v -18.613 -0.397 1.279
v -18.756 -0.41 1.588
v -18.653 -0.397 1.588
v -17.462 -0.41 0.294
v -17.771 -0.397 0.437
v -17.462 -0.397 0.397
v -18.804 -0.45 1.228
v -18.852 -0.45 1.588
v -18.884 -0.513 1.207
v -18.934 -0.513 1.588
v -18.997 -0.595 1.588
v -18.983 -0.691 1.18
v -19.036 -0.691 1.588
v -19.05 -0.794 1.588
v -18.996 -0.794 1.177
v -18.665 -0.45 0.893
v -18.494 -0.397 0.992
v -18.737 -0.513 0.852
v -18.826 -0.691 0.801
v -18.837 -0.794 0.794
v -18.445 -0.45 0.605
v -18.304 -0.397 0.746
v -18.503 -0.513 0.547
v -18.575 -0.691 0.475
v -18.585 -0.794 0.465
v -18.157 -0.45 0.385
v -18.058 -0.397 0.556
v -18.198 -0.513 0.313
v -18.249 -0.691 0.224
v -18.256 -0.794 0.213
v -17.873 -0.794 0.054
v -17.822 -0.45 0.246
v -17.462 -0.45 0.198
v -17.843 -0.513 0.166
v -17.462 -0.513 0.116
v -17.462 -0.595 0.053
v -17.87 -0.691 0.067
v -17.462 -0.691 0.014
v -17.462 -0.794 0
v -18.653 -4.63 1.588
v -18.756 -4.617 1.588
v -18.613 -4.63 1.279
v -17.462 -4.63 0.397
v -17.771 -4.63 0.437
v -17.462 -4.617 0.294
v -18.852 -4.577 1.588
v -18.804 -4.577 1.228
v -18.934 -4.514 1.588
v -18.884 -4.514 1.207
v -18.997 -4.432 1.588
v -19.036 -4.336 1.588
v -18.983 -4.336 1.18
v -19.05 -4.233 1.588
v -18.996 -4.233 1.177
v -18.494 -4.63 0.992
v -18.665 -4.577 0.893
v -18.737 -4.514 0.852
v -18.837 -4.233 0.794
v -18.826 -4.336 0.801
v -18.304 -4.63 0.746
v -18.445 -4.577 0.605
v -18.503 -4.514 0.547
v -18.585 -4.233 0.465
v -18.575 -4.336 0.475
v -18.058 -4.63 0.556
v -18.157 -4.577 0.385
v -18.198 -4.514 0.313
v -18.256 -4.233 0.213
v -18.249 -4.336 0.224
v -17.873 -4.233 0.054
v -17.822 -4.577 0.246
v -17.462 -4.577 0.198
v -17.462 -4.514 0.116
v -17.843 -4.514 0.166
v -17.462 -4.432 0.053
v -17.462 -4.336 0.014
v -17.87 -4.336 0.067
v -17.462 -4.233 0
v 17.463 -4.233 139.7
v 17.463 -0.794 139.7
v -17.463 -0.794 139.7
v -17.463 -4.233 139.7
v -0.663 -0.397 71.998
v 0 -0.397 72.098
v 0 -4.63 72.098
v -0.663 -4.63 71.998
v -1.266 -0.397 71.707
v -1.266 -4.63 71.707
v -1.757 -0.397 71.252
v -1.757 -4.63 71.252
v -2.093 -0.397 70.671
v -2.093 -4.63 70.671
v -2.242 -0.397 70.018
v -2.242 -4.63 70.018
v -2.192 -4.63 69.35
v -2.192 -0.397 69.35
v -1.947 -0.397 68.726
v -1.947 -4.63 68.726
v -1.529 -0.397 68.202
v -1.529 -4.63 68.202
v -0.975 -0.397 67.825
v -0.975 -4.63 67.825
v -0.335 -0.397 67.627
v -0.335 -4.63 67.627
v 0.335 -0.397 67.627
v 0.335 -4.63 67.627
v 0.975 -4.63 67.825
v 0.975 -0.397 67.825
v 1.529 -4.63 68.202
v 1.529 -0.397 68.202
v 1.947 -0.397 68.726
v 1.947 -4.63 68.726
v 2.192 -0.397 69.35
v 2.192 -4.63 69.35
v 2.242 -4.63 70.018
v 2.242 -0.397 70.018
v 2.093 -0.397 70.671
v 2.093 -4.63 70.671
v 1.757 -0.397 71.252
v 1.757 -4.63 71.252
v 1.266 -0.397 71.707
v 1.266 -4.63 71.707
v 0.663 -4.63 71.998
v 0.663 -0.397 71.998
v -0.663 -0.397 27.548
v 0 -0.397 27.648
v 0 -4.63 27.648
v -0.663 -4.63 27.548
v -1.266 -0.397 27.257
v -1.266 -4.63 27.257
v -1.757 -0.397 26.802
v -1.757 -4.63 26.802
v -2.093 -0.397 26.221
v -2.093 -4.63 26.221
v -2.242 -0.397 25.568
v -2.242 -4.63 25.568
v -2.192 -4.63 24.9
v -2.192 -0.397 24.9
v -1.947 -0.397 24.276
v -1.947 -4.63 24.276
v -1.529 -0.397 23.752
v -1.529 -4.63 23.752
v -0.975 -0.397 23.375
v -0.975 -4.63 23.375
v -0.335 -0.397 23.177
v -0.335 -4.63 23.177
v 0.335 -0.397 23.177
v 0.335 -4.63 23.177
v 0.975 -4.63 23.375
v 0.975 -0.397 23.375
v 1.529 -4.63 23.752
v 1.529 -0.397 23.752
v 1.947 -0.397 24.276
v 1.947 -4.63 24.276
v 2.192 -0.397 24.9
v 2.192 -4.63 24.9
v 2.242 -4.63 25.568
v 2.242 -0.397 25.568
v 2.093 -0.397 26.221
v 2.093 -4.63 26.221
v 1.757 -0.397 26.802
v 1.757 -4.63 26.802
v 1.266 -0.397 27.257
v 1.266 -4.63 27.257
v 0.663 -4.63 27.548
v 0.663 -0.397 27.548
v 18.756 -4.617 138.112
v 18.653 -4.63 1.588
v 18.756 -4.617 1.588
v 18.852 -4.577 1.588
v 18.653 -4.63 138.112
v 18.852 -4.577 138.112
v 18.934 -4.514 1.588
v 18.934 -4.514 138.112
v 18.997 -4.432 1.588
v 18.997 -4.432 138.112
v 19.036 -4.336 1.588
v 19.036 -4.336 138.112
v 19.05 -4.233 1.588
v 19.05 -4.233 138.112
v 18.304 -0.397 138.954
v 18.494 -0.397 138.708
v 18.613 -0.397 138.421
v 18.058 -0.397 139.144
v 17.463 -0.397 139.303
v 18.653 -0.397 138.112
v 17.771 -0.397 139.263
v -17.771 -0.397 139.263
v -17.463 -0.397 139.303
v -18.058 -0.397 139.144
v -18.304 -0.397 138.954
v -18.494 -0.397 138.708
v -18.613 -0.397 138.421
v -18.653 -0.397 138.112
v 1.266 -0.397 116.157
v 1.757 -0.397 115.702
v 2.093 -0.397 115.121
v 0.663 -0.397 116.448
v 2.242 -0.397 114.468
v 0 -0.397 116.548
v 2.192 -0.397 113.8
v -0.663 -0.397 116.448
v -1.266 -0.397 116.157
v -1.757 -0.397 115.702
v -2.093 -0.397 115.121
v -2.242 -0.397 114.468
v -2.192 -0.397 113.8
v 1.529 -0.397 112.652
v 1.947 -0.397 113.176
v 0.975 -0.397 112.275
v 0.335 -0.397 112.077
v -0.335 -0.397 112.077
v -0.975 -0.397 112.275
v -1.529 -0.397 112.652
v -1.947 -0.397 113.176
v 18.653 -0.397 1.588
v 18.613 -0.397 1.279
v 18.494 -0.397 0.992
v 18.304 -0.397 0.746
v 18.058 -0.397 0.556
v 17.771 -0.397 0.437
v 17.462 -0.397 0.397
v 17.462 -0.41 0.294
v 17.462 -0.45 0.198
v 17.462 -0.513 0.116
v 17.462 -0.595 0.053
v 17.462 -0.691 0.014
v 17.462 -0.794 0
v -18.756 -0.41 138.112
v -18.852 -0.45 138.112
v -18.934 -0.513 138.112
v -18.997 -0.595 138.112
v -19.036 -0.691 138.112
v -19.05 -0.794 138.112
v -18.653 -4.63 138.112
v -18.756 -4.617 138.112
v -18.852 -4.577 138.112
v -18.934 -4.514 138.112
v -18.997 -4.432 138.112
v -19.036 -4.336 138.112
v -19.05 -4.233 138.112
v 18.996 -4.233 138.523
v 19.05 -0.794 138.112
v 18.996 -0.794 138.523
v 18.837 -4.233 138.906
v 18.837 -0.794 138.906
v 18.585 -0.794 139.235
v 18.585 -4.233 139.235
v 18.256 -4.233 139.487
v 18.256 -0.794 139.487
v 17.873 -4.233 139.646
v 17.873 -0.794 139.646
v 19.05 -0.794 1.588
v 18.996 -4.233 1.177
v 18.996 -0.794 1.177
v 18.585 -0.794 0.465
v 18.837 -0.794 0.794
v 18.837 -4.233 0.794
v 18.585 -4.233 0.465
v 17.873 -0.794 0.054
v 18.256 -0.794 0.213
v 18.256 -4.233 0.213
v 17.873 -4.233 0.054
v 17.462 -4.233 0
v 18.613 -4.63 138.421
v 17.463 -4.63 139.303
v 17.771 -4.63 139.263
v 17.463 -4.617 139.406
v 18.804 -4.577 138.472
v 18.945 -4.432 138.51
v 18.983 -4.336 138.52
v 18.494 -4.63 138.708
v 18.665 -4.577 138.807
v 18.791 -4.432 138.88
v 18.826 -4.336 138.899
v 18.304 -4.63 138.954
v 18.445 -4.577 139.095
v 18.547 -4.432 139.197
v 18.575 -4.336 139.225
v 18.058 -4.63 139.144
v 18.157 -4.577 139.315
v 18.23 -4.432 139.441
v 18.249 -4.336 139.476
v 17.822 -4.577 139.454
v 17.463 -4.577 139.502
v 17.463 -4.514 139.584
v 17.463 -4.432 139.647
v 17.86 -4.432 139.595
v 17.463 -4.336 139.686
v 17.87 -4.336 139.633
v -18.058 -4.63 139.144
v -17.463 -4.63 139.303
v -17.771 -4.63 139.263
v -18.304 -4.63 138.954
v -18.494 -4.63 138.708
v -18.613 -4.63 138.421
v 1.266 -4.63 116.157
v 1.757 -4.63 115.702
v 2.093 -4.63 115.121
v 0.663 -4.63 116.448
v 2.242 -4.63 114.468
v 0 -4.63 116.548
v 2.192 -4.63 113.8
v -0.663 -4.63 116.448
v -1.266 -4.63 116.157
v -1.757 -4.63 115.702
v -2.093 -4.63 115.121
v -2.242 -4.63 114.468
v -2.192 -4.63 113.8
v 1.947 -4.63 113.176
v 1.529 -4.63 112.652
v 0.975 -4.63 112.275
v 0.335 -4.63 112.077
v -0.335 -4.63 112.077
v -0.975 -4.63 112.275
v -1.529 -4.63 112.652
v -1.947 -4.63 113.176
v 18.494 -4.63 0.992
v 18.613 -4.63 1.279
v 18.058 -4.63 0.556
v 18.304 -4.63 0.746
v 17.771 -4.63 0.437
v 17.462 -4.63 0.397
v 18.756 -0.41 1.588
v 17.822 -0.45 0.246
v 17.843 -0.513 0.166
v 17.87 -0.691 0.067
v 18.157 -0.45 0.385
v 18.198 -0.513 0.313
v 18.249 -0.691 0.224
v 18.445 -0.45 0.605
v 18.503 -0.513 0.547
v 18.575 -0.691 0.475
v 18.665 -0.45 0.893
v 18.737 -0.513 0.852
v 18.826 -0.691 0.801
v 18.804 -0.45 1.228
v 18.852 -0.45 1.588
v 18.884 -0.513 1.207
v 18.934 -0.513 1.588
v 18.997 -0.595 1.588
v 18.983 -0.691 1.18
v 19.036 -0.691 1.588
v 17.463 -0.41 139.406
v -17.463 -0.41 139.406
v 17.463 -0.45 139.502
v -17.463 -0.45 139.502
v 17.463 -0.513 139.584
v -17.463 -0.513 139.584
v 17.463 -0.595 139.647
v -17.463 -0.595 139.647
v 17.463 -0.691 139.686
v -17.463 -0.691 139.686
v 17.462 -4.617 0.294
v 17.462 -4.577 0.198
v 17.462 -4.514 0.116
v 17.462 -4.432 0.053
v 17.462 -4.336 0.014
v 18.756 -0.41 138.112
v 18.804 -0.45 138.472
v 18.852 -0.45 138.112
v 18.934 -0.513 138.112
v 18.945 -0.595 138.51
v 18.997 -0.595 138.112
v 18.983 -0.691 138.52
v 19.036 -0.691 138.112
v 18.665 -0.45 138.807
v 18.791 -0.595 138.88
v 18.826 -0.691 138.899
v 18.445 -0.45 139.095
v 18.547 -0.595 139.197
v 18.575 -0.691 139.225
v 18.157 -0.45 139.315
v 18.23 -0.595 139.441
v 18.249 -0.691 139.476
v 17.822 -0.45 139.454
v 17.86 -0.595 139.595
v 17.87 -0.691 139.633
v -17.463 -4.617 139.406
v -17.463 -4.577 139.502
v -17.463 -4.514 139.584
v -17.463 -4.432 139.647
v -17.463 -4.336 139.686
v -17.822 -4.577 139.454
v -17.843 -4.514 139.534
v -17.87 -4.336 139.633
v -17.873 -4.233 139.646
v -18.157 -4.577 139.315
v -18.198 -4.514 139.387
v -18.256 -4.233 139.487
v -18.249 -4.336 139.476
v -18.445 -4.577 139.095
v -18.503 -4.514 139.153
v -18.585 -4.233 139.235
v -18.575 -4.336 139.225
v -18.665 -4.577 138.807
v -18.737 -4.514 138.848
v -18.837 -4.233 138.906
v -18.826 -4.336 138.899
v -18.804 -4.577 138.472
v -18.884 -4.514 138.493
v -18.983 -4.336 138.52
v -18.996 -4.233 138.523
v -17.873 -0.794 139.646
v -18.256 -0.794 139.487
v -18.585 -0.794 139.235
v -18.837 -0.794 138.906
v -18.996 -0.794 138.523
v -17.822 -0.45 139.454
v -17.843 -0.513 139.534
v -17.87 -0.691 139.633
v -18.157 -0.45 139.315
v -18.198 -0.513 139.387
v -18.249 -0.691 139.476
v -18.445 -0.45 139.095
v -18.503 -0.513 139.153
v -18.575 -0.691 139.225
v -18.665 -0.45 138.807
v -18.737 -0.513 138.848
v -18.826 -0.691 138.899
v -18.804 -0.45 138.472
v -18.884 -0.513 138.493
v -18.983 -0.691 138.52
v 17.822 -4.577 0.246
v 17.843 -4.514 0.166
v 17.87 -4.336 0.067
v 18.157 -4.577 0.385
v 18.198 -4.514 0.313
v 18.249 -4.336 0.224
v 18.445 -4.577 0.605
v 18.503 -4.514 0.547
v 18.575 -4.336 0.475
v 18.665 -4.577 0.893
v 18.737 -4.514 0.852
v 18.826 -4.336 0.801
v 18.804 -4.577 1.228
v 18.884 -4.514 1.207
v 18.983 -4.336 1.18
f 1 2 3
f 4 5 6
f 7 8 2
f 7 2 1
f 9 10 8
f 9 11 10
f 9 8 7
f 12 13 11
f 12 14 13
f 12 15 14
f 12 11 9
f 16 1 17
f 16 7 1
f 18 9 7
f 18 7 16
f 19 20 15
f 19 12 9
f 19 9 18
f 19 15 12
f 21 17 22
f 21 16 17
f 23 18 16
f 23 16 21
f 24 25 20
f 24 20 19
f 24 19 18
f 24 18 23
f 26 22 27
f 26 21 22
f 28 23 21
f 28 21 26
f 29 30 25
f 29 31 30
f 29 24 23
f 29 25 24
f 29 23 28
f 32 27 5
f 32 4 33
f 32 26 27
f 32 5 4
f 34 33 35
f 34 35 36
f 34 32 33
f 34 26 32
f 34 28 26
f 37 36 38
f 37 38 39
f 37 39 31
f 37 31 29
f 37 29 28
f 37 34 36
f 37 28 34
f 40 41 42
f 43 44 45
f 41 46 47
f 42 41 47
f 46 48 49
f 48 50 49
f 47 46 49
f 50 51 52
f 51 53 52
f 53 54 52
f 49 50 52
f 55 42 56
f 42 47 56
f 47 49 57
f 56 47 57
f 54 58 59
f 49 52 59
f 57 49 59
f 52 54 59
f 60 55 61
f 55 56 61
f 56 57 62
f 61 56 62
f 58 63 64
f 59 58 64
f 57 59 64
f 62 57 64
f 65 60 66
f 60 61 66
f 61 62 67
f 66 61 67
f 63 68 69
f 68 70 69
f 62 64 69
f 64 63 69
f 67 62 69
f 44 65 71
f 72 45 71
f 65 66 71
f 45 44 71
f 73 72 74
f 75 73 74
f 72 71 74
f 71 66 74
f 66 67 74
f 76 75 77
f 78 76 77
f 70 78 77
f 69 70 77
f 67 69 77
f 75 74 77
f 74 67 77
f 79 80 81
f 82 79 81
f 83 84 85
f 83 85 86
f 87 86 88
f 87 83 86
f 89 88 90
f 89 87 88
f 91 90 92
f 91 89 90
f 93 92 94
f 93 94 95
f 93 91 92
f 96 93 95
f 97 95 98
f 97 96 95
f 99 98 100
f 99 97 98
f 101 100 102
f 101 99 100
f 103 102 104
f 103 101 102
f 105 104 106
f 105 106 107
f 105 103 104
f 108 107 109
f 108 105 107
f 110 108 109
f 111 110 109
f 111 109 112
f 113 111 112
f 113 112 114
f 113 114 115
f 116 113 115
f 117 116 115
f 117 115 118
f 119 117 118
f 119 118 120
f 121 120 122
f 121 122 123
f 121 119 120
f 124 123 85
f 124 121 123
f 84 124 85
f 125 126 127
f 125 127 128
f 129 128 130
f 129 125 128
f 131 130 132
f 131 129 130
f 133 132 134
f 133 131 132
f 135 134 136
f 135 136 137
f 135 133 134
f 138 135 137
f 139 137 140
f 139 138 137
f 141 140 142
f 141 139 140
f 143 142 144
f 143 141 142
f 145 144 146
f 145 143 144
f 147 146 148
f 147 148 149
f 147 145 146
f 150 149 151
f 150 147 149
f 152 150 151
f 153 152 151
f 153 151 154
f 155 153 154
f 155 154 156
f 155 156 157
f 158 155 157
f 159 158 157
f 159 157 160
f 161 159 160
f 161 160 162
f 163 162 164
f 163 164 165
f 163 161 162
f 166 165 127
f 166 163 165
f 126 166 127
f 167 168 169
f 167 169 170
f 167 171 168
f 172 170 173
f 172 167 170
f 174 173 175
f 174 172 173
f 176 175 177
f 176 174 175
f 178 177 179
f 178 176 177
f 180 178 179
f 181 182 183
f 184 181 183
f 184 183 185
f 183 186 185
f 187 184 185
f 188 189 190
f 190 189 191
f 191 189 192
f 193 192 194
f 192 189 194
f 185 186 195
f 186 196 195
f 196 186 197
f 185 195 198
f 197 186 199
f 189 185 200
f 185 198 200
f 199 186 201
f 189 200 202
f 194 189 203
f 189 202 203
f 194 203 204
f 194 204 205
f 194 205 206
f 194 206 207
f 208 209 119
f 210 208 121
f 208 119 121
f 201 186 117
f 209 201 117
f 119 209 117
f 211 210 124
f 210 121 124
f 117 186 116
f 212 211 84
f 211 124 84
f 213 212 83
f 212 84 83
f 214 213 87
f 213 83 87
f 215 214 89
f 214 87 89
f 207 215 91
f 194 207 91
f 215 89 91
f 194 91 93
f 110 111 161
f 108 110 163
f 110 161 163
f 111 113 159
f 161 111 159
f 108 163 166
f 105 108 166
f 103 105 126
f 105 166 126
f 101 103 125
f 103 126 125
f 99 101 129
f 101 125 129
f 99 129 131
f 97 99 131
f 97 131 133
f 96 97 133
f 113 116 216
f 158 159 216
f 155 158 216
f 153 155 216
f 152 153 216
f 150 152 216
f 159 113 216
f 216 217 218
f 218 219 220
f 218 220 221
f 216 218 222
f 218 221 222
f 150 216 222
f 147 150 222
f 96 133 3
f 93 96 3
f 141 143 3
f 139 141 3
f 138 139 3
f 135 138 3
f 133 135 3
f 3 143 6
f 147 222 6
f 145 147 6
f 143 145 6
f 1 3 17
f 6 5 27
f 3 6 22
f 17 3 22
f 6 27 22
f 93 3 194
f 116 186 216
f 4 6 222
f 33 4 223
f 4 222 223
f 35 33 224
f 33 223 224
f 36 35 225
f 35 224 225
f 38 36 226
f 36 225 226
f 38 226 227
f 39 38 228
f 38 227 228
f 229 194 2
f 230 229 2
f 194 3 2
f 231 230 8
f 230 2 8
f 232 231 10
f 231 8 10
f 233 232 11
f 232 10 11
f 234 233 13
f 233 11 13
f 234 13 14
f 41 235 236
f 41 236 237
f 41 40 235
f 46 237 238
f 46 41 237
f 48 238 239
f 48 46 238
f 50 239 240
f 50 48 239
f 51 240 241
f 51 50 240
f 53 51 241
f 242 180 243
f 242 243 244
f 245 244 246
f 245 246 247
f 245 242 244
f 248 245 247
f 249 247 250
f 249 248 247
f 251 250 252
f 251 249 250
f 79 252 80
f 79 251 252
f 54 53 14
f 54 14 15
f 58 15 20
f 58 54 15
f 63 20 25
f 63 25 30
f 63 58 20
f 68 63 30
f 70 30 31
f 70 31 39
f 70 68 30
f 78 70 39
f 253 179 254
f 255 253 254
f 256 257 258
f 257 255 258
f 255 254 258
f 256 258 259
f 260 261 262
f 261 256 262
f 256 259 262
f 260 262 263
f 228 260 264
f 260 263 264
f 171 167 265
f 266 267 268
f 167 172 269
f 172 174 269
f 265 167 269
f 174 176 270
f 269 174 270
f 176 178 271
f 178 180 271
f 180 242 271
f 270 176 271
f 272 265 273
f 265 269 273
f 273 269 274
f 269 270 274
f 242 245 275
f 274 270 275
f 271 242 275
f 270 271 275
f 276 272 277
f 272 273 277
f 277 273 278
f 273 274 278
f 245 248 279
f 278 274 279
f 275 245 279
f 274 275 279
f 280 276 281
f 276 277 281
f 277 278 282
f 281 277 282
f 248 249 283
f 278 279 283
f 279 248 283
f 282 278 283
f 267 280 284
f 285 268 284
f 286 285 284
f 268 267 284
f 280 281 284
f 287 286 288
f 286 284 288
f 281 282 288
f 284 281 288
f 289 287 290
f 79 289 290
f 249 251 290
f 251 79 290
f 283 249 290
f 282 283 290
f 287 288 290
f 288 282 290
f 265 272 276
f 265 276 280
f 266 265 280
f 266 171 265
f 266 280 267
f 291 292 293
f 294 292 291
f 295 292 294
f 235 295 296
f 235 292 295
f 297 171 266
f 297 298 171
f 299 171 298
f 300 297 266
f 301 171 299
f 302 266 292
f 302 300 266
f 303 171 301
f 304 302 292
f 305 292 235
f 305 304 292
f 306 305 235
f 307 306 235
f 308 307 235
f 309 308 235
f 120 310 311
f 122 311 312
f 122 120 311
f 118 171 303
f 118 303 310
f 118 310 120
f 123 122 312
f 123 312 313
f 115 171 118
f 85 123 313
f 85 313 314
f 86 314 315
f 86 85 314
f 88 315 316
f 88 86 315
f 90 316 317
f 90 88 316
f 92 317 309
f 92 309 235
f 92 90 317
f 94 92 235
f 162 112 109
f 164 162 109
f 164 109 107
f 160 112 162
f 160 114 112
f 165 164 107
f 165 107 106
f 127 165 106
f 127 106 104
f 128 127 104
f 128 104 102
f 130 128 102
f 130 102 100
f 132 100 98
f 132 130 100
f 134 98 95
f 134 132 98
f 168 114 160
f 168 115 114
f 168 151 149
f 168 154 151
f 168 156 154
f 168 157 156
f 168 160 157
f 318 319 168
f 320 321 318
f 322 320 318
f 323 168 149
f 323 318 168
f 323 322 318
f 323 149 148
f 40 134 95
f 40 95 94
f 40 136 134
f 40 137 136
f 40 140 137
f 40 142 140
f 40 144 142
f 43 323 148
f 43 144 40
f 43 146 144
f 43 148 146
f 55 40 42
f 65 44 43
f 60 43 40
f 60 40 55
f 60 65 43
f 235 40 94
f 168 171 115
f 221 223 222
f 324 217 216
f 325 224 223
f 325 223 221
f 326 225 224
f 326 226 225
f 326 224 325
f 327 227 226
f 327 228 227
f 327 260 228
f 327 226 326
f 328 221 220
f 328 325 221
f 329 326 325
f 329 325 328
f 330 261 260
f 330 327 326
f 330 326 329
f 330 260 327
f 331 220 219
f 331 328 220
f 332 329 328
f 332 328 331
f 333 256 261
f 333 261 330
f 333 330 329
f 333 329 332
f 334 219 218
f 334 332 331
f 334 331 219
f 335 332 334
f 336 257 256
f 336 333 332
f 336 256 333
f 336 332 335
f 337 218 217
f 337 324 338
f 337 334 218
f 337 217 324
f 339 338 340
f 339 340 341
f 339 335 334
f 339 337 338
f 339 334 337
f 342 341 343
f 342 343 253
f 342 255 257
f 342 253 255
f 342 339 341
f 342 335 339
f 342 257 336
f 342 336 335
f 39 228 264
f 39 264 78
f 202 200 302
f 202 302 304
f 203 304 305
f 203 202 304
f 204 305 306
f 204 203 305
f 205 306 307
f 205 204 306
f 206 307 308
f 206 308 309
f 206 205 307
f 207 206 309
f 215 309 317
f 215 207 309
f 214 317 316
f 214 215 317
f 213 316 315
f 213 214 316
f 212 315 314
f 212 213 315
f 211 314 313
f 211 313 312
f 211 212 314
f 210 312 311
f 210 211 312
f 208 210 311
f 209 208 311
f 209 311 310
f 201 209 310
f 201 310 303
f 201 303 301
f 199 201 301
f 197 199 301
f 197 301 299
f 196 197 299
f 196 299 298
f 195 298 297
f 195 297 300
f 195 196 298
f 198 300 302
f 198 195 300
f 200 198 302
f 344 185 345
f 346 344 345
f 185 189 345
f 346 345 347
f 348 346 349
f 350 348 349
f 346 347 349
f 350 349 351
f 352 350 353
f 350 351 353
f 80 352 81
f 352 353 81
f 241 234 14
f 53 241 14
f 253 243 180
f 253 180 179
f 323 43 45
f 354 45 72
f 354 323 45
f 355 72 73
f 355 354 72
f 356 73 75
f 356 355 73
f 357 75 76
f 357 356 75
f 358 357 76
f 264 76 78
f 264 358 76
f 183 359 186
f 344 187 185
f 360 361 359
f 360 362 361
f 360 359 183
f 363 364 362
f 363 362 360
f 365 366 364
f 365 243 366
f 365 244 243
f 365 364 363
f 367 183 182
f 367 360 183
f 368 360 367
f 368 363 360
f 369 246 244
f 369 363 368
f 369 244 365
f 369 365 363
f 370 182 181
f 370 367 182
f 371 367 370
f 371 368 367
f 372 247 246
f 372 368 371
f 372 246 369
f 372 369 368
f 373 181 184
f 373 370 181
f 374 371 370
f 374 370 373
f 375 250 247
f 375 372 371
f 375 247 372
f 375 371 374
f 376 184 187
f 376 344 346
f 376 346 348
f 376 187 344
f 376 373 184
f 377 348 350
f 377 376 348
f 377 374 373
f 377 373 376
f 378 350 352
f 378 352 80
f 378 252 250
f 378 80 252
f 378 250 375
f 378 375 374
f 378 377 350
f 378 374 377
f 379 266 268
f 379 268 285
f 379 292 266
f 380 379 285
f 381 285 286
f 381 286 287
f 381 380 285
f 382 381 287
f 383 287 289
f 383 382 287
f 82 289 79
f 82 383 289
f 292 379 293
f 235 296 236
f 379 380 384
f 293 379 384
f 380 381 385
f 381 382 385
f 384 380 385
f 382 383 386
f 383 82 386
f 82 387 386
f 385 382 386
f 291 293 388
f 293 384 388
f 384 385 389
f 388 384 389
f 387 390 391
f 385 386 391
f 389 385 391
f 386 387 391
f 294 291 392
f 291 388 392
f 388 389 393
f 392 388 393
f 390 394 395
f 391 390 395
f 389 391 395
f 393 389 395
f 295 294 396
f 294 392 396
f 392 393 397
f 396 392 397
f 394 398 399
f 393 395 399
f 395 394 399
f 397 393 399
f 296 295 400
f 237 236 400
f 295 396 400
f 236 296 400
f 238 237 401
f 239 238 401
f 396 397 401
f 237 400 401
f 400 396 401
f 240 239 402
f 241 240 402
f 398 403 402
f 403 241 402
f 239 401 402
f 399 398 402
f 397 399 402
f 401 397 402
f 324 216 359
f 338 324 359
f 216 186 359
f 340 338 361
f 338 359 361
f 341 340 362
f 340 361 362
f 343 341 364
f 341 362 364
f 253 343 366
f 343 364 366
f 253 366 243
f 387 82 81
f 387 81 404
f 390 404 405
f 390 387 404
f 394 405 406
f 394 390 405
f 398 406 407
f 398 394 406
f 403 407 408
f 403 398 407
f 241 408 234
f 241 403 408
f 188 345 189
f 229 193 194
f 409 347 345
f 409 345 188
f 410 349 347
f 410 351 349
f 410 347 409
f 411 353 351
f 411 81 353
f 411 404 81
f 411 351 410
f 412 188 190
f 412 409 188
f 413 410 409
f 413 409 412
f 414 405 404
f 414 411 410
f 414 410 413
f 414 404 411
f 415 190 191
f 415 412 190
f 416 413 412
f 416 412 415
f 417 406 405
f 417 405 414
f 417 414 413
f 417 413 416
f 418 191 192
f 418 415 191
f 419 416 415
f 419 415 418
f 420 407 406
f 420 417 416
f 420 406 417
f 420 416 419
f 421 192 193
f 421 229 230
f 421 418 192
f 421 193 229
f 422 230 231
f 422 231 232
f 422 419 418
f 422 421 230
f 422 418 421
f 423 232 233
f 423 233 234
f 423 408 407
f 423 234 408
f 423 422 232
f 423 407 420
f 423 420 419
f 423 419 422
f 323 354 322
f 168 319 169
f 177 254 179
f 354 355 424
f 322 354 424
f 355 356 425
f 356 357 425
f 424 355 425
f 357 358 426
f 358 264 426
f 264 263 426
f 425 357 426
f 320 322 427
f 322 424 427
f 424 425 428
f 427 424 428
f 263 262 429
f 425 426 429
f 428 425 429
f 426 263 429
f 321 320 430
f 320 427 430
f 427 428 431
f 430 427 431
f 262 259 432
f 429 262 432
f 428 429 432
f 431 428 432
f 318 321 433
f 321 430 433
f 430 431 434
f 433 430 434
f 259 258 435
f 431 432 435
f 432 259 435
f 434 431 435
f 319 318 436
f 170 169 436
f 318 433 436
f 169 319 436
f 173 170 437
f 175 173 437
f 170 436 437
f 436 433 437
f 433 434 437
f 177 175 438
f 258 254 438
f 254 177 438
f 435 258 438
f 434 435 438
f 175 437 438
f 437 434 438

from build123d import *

# Parameters (mm, degrees)
BOSS_EXTRUDE1_DEPTH = 139.7
FILLET1_R           = 1.27
BOSS_EXTRUDE2_DEPTH = 25.4
FILLET2_R           = 1.27
FILLET3_R           = 1.27
FILLET4_R           = 1.27
SKETCH9_W           = 38.1
SKETCH9_H           = 139.7
BOSS_EXTRUDE3_DEPTH = 4.233333333
FILLET6_R           = 1.5875
FILLET7_R           = 0.396875
LPATTERN1_COUNT     = 2
LPATTERN1_PITCH     = 44.45
LPATTERN1_COL_COUNT = 2
LPATTERN1_COL_PITCH = 44.45
FILLET5_R           = 1.5875


with BuildPart() as part:
    # Sketch1 → Boss-Extrude1 (new body)
    with BuildSketch(Plane.XY):
        Polygon((-19.05, 0), (19.05, 0), (19.05, 12.7), (11.528846515, 12.7), (14.816666667, 4.7625), (-14.816666667, 4.7625), (-11.528846515, 12.7), (-19.05, 12.7), align=None)
    extrude(amount=BOSS_EXTRUDE1_DEPTH)

    # Fillet1
    fillet1_edges = [part.edges().sort_by_distance(p)[0] for p in [
        (-19.05, 12.7, 69.85),
        (-11.528846515, 12.7, 69.85),
        (-14.816666667, 4.7625, 69.85),
        (14.816666667, 4.7625, 69.85),
        (11.528846515, 12.7, 69.85),
        (19.05, 12.7, 69.85),
    ]]
    fillet(fillet1_edges, radius=FILLET1_R)

    # Fillet3
    fillet3_edges = [part.edges().sort_by_distance(p)[0] for p in [
        (19.05, 5.715, 0),
        (15.604767917, 12.7, 0),
        (15.604767917, 12.7, 139.7),
        (-19.05, 5.715, 0),
        (-15.604767917, 12.7, 0),
        (-13.172756591, 8.73125, 0),
        (0, 4.7625, 0),
        (13.172756591, 8.73125, 0),
        (-12.373569426, 12.135574196, 0),
        (-18.678025612, 12.328025612, 0),
        (12.373569426, 12.135574196, 0),
        (18.678025612, 12.328025612, 0),
        (13.172756591, 8.73125, 139.7),
        (0, 0, 139.7),
        (0, 4.7625, 139.7),
        (-13.172756591, 8.73125, 139.7),
        (-15.604767917, 12.7, 139.7),
        (-19.05, 5.715, 139.7),
        (-12.373569426, 12.135574196, 139.7),
        (-18.678025612, 12.328025612, 139.7),
        (12.373569426, 12.135574196, 139.7),
        (18.678025612, 12.328025612, 139.7),
        (13.971943756, 5.326925804, 0),
        (13.971943756, 5.326925804, 139.7),
        (-13.971943756, 5.326925804, 0),
        (-13.971943756, 5.326925804, 139.7),
        (19.05, 5.715, 139.7),
        (0, 0, 0),
    ]]
    fillet(fillet3_edges, radius=FILLET3_R)


with BuildPart() as body_2:
    # Sketch2 → Boss-Extrude2 (new body)
    with BuildSketch(Plane.XY.offset(139.7)):
        with BuildLine():
            Line((-11.904210726, 10.798189653), (11.904210726, 10.798189653))
            Line((11.904210726, 10.798189653), (13.737306252, 6.372705571))
            ThreePointArc((13.737306252, 6.372705571), (13.655153833, 5.538598063), (12.915977348, 5.1435))
            Line((12.915977348, 5.1435), (-12.915977348, 5.1435))
            ThreePointArc((-12.915977348, 5.1435), (-13.655153833, 5.538598063), (-13.737306252, 6.372705571))
            Line((-13.737306252, 6.372705571), (-11.904210726, 10.798189653))
        make_face()
    extrude(amount=BOSS_EXTRUDE2_DEPTH)

    # Fillet2
    fillet2_edges = [body_2.edges().sort_by_distance(p)[0] for p in [
        (-11.904210726, 10.798189653, 152.4),
        (11.904210726, 10.798189653, 152.4),
    ]]
    fillet(fillet2_edges, radius=FILLET2_R)

    # Fillet4
    fillet4_edges = [body_2.edges().sort_by_distance(p)[0] for p in [
        (-13.655153833, 5.538598063, 165.1),
        (0, 10.798189653, 139.7),
        (0, 10.798189653, 165.1),
        (0, 5.1435, 165.1),
        (-12.983128557, 8.193451592, 139.7),
        (-11.761198052, 10.584156061, 139.7),
        (11.761198052, 10.584156061, 139.7),
        (-12.983128557, 8.193451592, 165.1),
        (-11.761198052, 10.584156061, 165.1),
        (13.655153833, 5.538598063, 165.1),
        (11.761198052, 10.584156061, 165.1),
        (12.983128557, 8.193451592, 165.1),
        (13.655153833, 5.538598063, 139.7),
        (0, 5.1435, 139.7),
        (-13.655153833, 5.538598063, 139.7),
        (12.983128557, 8.193451592, 139.7),
    ]]
    fillet(fillet4_edges, radius=FILLET4_R)

    # Sketch4 → CSK for 1/4 Flat Head Machine Screw (100)1 (revolve, cut)
    with BuildSketch(Plane(origin=(0, 5.1435, 152.4), x_dir=(0, 0, -1), z_dir=(1, 0, 0))):
        Polygon((0, 0), (0, 7.5565), (3.3782, 7.5565), (3.3782, 2.568232241), (6.4389, 0), align=None)
    revolve(axis=Axis((0, -1.2065, 152.4), (0, 1, 0)), mode=Mode.SUBTRACT)


with BuildPart() as body_3:
    # Sketch9 → Boss-Extrude3 (new body)
    with BuildSketch(Plane(origin=(0, -0.396875, 0), x_dir=(-1, 0, 0), z_dir=(0, -1, 0))):
        with Locations((0, -69.85)):
            Rectangle(SKETCH9_W, SKETCH9_H)
    extrude(amount=BOSS_EXTRUDE3_DEPTH)

    # Fillet6
    fillet6_edges = [body_3.edges().sort_by_distance(p)[0] for p in [
        (19.05, -2.513541667, 0),
        (-19.05, -2.513541667, 0),
        (-19.05, -2.513541667, 139.7),
        (19.05, -2.513541667, 139.7),
    ]]
    fillet(fillet6_edges, radius=FILLET6_R)

    # Fillet7
    fillet7_edges = [body_3.edges().sort_by_distance(p)[0] for p in [
        (0, -0.396875, 139.7),
        (0, -4.630208333, 139.7),
        (19.05, -0.396875, 69.85),
        (0, -0.396875, 0),
        (-19.05, -0.396875, 69.85),
        (18.585032015, -0.396875, 0.464967985),
        (-18.585032015, -0.396875, 0.464967985),
        (-18.585032015, -0.396875, 139.235032015),
        (18.585032015, -0.396875, 139.235032015),
        (19.05, -4.630208333, 69.85),
        (-19.05, -4.630208333, 69.85),
        (0, -4.630208333, 0),
        (18.585032015, -4.630208333, 0.464967985),
        (-18.585032015, -4.630208333, 0.464967985),
        (-18.585032015, -4.630208333, 139.235032015),
        (18.585032015, -4.630208333, 139.235032015),
    ]]
    fillet(fillet7_edges, radius=FILLET7_R)


with BuildPart() as csk_for_8_flat_head_machine_screw_100_tool:
    # Sketch6 → CSK for #8 Flat Head Machine Screw (100)1 (revolve)
    with BuildSketch(Plane(origin=(0, 4.7625, 69.85), x_dir=(0, 0, 1), z_dir=(1, 0, 0))):
        Polygon((0, 0), (0, 9.392708333), (2.2479, 9.392708333), (2.2479, 1.651767624), (4.2164, 0), align=None)
    csk_for_8_flat_head_machine_screw_100 = revolve(axis=Axis((0, 11.1125, 69.85), (0, -1, 0)))


with BuildPart() as part_1:
    add(part.part)

    # CSK for #8 Flat Head Machine Screw (100)1: cut by csk_for_8_flat_head_machine_screw_100_tool
    add(csk_for_8_flat_head_machine_screw_100_tool.part, mode=Mode.SUBTRACT)


with BuildPart() as body_3_1:
    add(body_3.part)

    # CSK for #8 Flat Head Machine Screw (100)1: cut by csk_for_8_flat_head_machine_screw_100_tool
    add(csk_for_8_flat_head_machine_screw_100_tool.part, mode=Mode.SUBTRACT)


with BuildPart() as lpattern1_tool:
    # LPattern1: CSK for #8 Flat Head Machine Screw (100)1 ×2
    with Locations(*[(0, 0, i * LPATTERN1_PITCH) for i in range(1, LPATTERN1_COUNT)]):
        add(csk_for_8_flat_head_machine_screw_100)


with BuildPart() as part_2:
    add(part_1.part)

    # LPattern1: cut by lpattern1_tool
    add(lpattern1_tool.part, mode=Mode.SUBTRACT)


with BuildPart() as body_3_2:
    add(body_3_1.part)

    # LPattern1: cut by lpattern1_tool
    add(lpattern1_tool.part, mode=Mode.SUBTRACT)


with BuildPart() as lpattern1_col_tool:
    # LPattern1 col: CSK for #8 Flat Head Machine Screw (100)1 ×2
    with Locations(*[(0, 0, -i * LPATTERN1_COL_PITCH) for i in range(1, LPATTERN1_COL_COUNT)]):
        add(csk_for_8_flat_head_machine_screw_100)


with BuildPart() as part_3:
    add(part_2.part)

    # LPattern1 col: cut by lpattern1_col_tool
    add(lpattern1_col_tool.part, mode=Mode.SUBTRACT)

    # Fillet5
    fillet5_edges = [part_3.edges().sort_by_distance(p)[0] for p in [
        (0, 4.7625, 65.6336),
        (0, 4.7625, 21.1836),
        (0, 4.7625, 110.0836),
    ]]
    fillet(fillet5_edges, radius=FILLET5_R)


with BuildPart() as body_3_3:
    add(body_3_2.part)

    # LPattern1 col: cut by lpattern1_col_tool
    add(lpattern1_col_tool.part, mode=Mode.SUBTRACT)


solid = body_3_3.part
